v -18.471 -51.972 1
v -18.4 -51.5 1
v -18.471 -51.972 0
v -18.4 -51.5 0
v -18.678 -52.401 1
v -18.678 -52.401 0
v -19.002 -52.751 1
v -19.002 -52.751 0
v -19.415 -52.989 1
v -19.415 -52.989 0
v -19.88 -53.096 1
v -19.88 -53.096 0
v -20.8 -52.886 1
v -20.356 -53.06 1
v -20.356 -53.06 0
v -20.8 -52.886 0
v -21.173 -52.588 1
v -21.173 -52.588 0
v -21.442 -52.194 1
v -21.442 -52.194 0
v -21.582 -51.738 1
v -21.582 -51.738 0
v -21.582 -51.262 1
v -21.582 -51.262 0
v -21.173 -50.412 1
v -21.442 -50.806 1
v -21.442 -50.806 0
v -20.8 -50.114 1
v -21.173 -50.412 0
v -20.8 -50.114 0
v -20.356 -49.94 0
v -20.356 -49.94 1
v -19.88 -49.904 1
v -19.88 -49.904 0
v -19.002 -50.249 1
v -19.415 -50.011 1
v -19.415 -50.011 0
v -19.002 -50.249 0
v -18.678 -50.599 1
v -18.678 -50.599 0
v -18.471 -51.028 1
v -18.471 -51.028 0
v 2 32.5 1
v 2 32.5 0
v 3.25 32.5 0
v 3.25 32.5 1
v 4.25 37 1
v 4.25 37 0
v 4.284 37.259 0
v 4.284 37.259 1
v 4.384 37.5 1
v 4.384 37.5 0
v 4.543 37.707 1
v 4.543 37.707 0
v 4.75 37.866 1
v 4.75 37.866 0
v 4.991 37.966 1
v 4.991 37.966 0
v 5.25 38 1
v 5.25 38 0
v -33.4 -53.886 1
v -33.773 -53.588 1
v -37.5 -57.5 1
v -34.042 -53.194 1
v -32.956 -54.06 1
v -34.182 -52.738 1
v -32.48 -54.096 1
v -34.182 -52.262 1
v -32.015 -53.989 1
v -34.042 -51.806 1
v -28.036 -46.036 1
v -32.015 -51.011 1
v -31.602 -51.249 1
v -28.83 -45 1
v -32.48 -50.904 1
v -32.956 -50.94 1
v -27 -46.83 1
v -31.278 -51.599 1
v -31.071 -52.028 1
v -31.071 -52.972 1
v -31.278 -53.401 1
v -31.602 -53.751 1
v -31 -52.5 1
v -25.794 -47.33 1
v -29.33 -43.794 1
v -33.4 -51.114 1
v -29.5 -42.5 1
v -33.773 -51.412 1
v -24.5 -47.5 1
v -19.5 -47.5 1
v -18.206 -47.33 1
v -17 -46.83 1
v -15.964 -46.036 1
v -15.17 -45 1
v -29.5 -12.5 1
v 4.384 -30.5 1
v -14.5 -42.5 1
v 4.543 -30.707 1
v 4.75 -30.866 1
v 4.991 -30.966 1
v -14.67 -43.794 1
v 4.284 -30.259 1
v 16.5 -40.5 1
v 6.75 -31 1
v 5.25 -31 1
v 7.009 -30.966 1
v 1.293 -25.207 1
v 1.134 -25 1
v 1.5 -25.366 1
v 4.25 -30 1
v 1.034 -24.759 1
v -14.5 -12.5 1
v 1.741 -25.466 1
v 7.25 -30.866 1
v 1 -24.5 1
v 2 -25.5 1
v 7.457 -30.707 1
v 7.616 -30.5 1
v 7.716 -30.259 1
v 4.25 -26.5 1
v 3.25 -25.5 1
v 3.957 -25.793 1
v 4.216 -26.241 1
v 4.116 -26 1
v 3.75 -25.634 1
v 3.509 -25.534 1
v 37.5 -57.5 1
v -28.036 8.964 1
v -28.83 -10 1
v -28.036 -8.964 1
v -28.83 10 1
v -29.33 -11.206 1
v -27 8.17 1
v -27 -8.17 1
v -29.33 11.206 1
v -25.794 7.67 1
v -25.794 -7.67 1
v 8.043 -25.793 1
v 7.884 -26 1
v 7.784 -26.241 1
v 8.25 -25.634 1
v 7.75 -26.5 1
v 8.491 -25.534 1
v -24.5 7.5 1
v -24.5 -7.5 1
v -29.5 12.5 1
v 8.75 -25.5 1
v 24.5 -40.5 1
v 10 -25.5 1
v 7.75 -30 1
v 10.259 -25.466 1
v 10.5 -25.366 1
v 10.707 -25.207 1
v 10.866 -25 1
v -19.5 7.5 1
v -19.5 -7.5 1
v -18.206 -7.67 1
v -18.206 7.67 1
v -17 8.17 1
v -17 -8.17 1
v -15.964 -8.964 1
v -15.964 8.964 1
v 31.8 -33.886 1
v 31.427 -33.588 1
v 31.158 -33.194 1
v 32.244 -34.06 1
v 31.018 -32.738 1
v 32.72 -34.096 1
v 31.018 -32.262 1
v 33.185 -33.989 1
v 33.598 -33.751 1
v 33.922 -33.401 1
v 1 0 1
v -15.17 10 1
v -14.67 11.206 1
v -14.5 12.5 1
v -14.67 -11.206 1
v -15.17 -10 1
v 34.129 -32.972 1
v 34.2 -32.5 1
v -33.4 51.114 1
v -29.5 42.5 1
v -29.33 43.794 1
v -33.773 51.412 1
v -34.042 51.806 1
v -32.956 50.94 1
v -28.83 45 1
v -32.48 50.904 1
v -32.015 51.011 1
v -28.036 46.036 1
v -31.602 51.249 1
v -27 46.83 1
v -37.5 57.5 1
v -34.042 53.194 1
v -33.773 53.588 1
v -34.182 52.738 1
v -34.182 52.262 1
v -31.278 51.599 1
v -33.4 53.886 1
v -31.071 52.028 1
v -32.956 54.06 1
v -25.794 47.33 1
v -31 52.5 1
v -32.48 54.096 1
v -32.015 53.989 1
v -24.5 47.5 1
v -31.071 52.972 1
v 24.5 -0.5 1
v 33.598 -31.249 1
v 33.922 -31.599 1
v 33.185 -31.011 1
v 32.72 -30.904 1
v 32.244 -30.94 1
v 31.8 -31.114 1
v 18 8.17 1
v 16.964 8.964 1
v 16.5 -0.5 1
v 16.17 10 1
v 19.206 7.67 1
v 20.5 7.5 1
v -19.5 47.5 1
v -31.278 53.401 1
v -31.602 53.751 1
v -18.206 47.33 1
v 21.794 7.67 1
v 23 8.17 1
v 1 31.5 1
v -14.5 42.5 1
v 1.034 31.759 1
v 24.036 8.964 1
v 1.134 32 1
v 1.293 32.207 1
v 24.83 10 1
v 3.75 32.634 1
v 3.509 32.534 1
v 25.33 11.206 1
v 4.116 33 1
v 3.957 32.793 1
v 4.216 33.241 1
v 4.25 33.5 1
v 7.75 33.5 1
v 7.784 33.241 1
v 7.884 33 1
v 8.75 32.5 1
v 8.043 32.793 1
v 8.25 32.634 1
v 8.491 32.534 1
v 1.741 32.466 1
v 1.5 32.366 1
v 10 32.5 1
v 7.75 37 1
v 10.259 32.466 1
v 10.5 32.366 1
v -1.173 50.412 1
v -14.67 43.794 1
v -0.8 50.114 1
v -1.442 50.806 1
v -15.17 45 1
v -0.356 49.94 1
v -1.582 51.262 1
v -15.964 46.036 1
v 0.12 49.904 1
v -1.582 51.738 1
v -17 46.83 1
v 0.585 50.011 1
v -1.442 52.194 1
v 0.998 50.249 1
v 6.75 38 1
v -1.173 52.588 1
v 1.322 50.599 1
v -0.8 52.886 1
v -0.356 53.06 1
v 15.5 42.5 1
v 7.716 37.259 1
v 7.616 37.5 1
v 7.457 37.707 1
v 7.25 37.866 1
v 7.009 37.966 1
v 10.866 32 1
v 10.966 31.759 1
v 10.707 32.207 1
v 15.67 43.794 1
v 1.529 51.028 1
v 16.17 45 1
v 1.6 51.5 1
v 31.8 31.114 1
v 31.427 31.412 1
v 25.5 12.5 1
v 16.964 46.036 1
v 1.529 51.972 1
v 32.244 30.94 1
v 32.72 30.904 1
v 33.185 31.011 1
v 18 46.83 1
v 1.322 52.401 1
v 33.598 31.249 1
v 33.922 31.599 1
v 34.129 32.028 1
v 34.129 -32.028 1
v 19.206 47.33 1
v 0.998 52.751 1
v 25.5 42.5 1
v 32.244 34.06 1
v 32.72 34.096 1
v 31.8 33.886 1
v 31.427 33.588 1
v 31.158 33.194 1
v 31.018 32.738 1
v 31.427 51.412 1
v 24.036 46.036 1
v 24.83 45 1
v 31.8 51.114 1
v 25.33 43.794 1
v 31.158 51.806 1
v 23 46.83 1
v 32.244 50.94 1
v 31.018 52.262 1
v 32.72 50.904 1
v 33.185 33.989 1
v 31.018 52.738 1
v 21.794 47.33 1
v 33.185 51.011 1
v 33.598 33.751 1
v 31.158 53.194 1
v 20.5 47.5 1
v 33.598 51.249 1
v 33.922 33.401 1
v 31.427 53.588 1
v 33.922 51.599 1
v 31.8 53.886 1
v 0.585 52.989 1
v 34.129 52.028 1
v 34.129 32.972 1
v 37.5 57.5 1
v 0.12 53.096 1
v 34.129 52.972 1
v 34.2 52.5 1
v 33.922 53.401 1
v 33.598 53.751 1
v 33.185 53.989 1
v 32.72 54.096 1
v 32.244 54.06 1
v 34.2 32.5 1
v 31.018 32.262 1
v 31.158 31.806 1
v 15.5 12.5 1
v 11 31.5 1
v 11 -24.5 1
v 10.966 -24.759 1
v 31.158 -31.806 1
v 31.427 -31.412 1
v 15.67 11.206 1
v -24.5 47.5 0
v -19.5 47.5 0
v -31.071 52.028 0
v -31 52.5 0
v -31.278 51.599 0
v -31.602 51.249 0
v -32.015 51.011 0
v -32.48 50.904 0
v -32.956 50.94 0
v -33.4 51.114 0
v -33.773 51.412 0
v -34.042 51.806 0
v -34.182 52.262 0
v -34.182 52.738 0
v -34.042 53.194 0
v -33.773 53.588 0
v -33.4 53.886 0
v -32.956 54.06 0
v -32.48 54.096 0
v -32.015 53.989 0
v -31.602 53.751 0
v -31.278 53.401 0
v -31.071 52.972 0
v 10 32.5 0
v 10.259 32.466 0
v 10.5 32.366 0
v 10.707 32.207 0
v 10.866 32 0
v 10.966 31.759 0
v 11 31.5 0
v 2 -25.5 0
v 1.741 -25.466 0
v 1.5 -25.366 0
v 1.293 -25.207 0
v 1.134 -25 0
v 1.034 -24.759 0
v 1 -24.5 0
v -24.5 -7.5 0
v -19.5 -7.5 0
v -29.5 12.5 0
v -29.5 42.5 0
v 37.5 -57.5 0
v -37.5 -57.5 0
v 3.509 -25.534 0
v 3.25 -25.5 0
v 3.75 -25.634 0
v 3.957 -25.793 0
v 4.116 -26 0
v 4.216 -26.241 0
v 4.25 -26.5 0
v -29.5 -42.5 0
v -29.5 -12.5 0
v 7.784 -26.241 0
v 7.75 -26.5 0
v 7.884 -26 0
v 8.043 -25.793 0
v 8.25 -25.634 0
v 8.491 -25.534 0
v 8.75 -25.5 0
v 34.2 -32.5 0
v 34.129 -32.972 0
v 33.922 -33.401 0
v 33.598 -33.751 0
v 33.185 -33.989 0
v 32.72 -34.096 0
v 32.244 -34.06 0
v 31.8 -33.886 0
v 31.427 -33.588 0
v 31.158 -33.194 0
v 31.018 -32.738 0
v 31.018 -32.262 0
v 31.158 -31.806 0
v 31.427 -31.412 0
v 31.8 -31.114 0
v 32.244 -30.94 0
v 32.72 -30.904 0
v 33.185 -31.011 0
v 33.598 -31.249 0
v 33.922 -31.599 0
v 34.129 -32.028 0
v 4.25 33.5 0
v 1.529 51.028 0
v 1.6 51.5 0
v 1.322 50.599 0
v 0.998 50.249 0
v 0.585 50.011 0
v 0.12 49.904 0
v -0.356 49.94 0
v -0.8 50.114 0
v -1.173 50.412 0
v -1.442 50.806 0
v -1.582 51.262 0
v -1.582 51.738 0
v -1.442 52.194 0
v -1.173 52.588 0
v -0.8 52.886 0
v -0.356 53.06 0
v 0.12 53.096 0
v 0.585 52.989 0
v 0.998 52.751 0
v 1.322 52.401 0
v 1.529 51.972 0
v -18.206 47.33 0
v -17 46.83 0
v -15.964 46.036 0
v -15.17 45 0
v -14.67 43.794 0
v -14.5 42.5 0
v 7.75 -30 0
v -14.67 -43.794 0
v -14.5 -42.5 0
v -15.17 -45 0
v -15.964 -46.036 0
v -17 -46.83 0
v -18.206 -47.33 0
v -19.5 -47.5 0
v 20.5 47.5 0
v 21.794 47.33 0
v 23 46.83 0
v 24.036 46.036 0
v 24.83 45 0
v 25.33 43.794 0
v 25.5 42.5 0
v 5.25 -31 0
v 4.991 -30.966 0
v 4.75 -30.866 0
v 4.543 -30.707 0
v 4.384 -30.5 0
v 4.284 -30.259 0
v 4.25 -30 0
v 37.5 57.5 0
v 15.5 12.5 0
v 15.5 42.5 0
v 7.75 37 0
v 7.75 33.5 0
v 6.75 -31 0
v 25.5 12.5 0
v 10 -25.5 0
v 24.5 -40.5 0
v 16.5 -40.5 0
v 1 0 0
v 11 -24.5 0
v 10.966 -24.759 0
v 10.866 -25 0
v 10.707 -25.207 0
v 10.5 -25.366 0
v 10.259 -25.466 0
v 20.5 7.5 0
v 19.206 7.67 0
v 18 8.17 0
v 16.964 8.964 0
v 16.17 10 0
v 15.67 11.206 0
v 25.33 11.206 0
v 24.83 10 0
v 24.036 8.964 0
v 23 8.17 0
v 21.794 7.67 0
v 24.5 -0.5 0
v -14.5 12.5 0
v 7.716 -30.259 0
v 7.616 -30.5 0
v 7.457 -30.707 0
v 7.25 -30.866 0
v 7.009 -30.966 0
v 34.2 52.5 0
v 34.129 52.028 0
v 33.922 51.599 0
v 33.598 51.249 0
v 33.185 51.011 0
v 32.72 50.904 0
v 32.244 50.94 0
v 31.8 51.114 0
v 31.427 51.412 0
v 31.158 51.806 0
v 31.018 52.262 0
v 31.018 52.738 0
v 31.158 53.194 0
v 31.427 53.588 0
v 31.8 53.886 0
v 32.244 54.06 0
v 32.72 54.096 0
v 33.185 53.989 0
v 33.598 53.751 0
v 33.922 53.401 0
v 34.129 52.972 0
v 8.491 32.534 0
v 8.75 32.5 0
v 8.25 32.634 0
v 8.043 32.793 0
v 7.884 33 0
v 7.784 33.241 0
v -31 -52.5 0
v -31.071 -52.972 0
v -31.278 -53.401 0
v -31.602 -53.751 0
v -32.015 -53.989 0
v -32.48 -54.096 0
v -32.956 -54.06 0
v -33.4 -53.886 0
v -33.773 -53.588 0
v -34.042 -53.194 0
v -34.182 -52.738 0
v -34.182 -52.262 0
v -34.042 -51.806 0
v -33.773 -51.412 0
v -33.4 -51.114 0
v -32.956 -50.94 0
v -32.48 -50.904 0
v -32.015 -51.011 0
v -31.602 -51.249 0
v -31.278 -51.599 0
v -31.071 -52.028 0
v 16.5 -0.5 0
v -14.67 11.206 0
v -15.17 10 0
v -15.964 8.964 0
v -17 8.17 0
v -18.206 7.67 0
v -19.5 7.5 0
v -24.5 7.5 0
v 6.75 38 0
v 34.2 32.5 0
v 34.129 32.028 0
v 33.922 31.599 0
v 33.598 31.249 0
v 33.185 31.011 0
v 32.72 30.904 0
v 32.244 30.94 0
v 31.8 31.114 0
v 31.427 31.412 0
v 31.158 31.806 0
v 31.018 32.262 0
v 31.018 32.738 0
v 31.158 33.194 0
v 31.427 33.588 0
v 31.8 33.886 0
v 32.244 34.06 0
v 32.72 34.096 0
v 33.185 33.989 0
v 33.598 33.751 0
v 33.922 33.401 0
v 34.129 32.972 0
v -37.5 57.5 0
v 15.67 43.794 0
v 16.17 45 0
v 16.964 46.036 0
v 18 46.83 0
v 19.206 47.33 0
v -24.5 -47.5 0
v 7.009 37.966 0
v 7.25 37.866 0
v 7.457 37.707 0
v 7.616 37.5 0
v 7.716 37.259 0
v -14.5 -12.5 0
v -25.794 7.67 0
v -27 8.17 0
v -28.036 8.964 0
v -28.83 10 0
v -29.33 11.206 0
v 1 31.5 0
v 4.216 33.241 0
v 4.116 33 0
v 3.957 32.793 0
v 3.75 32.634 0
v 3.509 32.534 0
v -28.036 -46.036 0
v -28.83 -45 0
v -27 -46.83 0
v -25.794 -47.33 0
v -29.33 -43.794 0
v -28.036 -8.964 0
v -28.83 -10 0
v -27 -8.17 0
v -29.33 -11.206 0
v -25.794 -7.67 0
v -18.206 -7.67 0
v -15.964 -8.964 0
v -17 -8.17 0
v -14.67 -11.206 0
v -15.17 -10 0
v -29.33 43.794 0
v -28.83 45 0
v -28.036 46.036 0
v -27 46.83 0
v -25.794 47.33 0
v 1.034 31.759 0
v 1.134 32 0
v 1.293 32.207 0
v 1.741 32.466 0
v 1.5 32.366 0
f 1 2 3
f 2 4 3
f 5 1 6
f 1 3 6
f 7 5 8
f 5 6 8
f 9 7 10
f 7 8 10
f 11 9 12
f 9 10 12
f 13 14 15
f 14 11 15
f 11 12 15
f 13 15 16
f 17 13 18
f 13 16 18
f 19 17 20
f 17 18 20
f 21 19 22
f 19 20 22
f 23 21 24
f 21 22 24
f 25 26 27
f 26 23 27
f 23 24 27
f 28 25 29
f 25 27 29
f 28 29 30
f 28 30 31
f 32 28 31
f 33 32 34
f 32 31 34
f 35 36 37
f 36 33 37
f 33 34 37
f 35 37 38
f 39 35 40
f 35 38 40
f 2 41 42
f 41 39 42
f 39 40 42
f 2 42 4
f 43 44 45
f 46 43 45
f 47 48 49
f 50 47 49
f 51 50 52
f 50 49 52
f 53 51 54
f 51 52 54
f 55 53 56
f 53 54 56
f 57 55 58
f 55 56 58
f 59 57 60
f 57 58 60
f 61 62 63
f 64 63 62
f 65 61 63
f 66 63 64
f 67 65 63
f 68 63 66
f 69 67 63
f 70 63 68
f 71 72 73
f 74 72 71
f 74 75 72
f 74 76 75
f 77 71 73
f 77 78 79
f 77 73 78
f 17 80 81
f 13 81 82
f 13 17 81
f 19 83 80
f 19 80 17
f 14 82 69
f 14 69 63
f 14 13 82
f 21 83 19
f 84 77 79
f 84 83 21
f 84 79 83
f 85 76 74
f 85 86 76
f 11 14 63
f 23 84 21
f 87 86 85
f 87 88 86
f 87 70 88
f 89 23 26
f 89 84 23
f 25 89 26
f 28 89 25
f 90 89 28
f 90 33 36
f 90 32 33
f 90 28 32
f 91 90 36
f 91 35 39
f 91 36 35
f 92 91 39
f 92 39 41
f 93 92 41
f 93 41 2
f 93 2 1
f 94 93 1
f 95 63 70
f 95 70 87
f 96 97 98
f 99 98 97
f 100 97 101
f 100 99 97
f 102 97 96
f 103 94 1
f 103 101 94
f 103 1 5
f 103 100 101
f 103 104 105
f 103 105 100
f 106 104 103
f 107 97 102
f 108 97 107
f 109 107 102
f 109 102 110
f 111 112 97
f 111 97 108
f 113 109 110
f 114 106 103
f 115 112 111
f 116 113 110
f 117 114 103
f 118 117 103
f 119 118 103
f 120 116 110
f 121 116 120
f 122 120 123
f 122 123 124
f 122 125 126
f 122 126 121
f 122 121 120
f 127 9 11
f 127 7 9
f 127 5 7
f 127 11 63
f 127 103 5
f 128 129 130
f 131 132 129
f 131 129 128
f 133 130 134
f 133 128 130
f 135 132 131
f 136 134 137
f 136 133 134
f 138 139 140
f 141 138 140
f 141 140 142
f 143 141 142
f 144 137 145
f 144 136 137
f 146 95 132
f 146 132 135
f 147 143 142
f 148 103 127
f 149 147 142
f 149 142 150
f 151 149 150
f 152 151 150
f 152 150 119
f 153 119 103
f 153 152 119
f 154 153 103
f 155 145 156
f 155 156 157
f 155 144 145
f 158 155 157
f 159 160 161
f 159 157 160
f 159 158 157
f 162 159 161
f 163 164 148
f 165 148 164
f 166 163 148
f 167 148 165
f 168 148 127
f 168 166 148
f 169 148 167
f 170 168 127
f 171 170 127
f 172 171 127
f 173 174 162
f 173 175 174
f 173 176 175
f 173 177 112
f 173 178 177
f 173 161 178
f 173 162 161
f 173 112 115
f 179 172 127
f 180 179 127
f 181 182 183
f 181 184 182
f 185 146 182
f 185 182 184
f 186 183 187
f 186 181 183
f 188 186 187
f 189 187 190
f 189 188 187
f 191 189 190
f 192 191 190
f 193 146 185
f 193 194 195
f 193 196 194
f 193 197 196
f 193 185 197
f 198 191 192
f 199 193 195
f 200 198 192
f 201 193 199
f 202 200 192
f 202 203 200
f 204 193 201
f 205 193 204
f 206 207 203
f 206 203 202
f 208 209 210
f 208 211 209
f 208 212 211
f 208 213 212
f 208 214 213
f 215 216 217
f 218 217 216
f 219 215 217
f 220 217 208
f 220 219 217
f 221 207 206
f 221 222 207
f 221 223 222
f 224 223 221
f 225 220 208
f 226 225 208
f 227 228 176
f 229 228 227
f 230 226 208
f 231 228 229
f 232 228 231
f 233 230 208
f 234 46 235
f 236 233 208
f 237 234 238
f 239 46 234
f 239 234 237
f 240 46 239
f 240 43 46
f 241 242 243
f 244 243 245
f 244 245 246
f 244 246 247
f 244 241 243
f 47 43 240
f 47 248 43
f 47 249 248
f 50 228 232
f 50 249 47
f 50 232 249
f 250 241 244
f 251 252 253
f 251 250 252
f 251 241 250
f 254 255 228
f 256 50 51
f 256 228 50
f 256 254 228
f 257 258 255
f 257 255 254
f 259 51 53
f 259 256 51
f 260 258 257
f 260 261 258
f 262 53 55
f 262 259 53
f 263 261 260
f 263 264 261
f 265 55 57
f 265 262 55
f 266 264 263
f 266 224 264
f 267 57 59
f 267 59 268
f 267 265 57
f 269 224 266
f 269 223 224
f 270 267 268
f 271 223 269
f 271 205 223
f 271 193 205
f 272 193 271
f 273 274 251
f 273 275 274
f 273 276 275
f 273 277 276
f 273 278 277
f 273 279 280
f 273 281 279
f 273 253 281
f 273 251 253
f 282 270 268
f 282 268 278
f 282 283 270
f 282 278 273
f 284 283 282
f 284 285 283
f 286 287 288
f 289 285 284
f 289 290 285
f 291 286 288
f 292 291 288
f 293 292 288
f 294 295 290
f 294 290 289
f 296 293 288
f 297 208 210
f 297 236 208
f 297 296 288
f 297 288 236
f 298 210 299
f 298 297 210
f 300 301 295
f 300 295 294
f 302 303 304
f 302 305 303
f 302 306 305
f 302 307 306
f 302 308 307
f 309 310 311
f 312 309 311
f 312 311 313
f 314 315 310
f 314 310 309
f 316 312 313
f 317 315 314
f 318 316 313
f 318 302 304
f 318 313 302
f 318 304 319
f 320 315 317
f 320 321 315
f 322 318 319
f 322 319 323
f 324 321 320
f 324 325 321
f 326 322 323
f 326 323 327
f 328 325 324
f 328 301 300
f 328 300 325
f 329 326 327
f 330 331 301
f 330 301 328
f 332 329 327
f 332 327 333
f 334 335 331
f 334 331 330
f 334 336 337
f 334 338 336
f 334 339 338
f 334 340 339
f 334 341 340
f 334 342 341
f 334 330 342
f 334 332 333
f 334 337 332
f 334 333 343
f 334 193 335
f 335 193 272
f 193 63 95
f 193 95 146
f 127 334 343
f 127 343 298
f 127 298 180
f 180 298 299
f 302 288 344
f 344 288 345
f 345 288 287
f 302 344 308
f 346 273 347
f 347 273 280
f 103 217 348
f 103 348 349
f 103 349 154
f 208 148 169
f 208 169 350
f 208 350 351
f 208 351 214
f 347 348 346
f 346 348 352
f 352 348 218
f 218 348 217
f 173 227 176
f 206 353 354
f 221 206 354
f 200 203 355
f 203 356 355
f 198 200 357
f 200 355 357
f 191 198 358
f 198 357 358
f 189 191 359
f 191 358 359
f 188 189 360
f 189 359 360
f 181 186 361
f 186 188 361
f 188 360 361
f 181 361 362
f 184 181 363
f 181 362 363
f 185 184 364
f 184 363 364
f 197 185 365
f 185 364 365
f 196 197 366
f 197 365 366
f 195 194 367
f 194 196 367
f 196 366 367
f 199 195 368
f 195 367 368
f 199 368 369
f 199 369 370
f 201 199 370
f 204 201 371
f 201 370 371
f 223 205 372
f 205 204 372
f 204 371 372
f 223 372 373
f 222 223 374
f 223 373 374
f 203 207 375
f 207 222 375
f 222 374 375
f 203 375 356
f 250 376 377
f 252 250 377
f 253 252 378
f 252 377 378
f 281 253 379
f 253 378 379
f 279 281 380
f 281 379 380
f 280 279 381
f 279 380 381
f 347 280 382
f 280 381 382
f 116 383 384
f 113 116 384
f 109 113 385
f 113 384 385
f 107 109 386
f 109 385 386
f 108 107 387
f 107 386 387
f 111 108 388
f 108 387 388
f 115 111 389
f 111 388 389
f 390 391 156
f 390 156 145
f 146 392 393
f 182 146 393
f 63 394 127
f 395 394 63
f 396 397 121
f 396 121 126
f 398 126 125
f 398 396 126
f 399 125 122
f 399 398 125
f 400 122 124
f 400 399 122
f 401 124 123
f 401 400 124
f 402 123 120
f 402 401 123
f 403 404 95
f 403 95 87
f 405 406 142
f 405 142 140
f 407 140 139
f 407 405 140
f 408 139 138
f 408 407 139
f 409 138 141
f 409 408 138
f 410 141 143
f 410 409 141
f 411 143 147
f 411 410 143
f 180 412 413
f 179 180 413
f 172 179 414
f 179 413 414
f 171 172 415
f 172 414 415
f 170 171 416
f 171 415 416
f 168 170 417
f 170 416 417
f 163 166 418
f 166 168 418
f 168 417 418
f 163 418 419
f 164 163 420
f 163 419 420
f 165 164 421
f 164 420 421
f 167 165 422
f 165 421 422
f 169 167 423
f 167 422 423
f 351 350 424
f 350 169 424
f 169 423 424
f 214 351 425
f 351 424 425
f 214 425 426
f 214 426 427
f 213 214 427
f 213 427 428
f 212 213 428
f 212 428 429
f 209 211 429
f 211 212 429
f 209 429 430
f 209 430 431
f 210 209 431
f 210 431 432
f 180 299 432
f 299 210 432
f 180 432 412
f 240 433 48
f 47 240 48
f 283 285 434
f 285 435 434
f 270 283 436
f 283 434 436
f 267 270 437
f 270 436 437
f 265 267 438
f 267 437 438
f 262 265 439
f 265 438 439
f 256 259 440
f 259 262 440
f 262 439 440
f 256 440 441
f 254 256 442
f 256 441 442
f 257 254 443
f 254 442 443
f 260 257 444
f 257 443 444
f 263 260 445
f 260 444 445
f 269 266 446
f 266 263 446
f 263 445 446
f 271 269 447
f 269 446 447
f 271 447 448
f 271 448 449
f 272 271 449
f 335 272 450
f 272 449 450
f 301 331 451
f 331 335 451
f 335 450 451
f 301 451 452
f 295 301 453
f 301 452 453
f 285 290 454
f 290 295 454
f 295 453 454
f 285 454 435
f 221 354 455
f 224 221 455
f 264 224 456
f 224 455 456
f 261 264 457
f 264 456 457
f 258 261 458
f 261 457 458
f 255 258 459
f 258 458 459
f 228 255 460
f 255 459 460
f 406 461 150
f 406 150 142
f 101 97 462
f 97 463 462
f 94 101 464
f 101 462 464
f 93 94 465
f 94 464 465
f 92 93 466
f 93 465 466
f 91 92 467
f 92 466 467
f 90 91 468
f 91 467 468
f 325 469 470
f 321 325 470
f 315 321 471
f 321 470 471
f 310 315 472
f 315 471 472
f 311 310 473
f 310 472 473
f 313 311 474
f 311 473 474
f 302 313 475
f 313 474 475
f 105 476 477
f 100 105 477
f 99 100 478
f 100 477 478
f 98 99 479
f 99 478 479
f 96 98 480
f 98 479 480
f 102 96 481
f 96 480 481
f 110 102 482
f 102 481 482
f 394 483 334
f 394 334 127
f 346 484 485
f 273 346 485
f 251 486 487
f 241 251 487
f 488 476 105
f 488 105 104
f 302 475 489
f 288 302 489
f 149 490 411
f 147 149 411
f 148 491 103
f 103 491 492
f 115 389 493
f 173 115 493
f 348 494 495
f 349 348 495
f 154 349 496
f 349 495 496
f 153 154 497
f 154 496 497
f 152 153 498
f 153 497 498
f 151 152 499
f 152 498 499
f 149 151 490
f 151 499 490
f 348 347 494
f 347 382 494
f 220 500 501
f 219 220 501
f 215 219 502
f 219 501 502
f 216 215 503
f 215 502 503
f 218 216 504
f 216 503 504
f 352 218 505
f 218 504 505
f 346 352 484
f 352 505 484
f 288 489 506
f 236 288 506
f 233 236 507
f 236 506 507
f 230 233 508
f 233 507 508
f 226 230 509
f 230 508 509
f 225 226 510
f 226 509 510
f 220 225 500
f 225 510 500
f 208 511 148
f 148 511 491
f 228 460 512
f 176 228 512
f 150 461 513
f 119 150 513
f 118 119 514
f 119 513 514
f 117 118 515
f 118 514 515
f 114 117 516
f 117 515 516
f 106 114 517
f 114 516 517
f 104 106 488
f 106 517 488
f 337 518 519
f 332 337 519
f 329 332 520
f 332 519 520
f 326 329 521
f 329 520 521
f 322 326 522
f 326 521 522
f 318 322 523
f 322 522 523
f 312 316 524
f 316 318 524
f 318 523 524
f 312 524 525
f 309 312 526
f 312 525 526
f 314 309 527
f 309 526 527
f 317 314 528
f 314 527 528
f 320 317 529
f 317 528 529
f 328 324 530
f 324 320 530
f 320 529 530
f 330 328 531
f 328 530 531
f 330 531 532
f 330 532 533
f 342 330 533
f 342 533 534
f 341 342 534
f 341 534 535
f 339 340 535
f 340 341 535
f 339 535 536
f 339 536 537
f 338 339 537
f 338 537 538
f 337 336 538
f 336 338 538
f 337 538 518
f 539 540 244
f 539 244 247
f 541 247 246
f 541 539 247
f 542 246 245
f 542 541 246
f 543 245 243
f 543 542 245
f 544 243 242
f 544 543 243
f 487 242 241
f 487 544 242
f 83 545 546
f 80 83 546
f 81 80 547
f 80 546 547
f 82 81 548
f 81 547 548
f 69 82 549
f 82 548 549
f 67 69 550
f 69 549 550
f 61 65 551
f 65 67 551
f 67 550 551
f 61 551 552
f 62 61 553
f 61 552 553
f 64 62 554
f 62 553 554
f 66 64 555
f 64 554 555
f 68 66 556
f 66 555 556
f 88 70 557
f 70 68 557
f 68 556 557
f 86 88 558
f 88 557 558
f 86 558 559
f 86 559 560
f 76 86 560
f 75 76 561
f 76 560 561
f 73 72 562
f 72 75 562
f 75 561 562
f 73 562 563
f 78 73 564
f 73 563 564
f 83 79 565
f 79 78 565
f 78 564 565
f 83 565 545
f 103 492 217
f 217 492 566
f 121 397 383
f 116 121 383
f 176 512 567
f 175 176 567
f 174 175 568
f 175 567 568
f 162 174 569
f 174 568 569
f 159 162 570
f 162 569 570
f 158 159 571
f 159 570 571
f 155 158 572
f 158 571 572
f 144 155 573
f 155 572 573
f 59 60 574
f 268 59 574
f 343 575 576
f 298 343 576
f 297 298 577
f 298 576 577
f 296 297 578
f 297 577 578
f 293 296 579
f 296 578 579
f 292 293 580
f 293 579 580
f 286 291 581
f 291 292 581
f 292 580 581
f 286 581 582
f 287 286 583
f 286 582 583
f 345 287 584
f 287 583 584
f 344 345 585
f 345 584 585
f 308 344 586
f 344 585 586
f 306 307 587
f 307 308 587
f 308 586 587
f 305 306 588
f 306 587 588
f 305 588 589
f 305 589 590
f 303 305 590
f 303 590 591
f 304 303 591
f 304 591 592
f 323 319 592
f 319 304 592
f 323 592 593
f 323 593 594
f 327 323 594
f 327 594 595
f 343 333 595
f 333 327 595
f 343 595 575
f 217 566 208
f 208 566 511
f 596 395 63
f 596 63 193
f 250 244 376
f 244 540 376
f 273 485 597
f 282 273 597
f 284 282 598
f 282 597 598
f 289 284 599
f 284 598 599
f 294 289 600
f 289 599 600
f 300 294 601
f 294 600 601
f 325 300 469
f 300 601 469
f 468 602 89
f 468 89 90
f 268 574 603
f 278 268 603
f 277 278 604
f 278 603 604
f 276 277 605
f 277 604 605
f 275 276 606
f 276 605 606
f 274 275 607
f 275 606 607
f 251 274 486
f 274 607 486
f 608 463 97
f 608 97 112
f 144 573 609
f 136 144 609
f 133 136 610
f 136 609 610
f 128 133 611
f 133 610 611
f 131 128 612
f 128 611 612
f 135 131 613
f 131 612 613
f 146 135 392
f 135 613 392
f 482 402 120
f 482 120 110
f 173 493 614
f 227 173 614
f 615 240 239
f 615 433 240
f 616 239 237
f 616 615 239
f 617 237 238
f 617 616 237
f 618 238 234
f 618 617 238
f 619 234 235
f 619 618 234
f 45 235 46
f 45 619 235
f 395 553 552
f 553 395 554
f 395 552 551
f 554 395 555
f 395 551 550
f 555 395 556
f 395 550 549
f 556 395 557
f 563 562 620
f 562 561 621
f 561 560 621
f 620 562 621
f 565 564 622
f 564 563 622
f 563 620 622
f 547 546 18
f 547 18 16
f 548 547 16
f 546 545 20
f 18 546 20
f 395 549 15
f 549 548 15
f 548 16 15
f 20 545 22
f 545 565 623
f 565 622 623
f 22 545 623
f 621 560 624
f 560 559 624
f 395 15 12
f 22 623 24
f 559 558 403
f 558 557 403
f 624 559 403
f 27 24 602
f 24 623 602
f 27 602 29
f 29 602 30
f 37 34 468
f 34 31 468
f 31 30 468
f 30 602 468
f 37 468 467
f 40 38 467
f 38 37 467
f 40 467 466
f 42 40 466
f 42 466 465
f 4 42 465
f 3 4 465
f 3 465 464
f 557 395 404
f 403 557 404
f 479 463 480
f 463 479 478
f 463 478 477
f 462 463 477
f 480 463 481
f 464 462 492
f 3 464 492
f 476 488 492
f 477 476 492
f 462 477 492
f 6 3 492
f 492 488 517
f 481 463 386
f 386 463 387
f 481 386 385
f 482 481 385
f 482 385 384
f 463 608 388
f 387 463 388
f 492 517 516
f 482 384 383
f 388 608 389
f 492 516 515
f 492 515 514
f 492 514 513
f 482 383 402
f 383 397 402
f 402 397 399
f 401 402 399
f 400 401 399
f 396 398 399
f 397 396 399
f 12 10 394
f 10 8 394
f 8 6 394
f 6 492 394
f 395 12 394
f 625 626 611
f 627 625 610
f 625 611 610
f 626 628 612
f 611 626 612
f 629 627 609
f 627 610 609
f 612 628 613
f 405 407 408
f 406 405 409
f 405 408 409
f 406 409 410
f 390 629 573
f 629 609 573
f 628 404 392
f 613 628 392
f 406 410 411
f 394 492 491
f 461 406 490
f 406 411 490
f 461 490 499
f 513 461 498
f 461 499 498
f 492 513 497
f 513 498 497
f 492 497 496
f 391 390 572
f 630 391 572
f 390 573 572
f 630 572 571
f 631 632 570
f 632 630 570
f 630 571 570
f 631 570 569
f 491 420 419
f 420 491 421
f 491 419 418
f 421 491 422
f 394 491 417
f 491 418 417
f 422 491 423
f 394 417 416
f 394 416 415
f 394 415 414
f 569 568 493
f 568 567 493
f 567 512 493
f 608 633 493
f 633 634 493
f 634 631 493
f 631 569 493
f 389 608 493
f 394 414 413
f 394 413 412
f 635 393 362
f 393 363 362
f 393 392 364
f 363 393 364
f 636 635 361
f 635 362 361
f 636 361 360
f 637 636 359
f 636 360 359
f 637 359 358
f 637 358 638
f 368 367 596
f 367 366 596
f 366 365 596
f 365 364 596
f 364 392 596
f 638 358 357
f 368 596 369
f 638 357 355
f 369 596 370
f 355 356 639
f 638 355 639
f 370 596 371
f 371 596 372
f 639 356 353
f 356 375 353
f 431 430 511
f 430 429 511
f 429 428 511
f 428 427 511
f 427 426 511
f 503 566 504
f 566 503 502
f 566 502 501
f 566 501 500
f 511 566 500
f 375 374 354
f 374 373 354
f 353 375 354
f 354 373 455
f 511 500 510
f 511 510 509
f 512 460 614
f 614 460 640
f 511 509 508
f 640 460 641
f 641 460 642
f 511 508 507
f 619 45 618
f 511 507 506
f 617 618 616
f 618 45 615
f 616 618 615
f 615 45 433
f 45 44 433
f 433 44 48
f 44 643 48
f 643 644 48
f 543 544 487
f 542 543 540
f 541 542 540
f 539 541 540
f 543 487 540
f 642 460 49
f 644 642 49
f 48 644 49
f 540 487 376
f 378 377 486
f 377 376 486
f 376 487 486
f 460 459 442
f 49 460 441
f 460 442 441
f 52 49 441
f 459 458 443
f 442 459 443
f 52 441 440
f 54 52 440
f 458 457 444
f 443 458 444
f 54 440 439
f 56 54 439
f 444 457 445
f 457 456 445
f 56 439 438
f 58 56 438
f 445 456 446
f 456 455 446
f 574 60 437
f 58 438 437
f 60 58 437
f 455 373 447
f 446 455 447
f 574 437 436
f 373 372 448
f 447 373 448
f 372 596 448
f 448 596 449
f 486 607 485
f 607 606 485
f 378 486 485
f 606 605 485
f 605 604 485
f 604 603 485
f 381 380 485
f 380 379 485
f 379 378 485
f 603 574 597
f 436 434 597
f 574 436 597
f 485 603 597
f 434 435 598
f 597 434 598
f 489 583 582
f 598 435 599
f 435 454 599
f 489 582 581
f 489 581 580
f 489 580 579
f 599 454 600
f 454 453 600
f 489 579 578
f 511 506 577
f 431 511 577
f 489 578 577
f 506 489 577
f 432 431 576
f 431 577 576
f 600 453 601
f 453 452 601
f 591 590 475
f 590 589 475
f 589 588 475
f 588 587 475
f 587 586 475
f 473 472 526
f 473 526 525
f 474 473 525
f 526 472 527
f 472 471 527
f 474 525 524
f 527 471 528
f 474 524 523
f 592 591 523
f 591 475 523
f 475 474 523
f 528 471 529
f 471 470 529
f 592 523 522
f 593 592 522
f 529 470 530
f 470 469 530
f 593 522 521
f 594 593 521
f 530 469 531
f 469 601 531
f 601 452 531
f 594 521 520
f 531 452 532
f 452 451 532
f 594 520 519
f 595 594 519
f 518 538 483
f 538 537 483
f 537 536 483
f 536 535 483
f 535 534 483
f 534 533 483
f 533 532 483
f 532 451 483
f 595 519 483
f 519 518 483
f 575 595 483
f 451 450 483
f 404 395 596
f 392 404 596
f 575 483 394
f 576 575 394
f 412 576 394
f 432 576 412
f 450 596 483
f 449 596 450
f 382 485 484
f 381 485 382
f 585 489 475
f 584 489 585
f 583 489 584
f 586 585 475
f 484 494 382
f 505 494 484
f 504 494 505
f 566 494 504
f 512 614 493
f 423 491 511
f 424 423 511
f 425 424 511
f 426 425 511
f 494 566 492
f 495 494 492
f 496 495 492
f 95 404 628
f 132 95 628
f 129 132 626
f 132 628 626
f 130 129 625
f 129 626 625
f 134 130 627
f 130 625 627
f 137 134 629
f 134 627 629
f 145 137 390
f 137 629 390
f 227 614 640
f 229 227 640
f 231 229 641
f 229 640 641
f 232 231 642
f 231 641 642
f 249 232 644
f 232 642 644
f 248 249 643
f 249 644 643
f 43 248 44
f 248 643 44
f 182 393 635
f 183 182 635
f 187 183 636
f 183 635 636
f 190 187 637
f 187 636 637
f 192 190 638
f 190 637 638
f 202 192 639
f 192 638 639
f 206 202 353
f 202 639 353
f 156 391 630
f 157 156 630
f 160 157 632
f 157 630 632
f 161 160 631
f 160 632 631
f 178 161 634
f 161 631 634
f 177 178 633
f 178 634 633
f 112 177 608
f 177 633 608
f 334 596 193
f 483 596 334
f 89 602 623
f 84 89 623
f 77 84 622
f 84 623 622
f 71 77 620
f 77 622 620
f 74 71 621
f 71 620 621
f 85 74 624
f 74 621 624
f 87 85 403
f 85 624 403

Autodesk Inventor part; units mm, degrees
ref_plane "YZ Plane" through (0, 0, 0) normal (1, 0, 0) x (0, 1, 0)
ref_plane "XZ Plane" through (0, 0, 0) normal (0, 1, 0) x (-1, 0, 0)
ref_plane "XY Plane" through (0, 0, 0) normal (0, 0, 1) x (1, 0, 0)
sketch "Sketch1" plane through (0, 0, 0) normal (0, 0, 1) x (1, 0, 0)
  line L0 (-37.5, 57.5) -> (37.5, 57.5)
  line L1 (37.5, 57.5) -> (37.5, -57.5)
  line L2 (37.5, -57.5) -> (-37.5, -57.5)
  line L3 (-37.5, -57.5) -> (-37.5, 57.5)
  line L4 (-37.5, 57.5) -> (37.5, -57.5) construction
  line L5 (37.5, 57.5) -> (-37.5, -57.5) construction
  line L6 (11, 31.5) -> (11, -24.5)
  line L7 (1, -24.5) -> (1, 31.5)
  line L8 (1, 32.5) -> (11, -25.5) construction
  line L9 (11, 32.5) -> (1, -25.5) construction
  line L10 (5.25, 38) -> (6.75, 38)
  line L11 (7.75, 37) -> (7.75, 33.5)
  line L12 (4.25, 33.5) -> (4.25, 37)
  line L13 (4.25, 38) -> (7.75, 32.5) construction
  line L14 (7.75, 38) -> (4.25, 32.5) construction
  line L15 (5.25, -31) -> (6.75, -31)
  line L16 (7.75, -30) -> (7.75, -26.5)
  line L17 (4.25, -26.5) -> (4.25, -30)
  line L18 (4.25, -31) -> (7.75, -25.5) construction
  line L19 (7.75, -31) -> (4.25, -25.5) construction
  circle A0 centre (-32.6, 52.5) radius 1.6
  line L20 (0, 0) -> (0, 3.4669)
  line L21 (0, 0) -> (3.1568, 0)
  circle A1 centre (32.6, 52.5) radius 1.6
  circle A2 centre (-32.6, -52.5) radius 1.6
  circle A3 centre (-20, -51.5) radius 1.6
  circle A4 centre (32.6, -32.5) radius 1.6
  circle A5 centre (32.6, 32.5) radius 1.6
  circle A6 centre (0, 51.5) radius 1.6
  line L22 (16.5, -0.5) -> (24.5, -0.5)
  line L23 (24.5, -0.5) -> (24.5, -40.5)
  line L24 (24.5, -40.5) -> (16.5, -40.5)
  line L25 (16.5, -40.5) -> (16.5, -0.5)
  line L26 (16.5, -0.5) -> (24.5, -40.5) construction
  line L27 (24.5, -0.5) -> (16.5, -40.5) construction
  line L28 (-24.5, 47.5) -> (-19.5, 47.5)
  line L29 (-14.5, 42.5) -> (-14.5, 12.5)
  line L30 (-19.5, 7.5) -> (-24.5, 7.5)
  line L31 (-29.5, 12.5) -> (-29.5, 42.5)
  line L32 (-29.5, 47.5) -> (-14.5, 7.5) construction
  line L33 (-14.5, 47.5) -> (-29.5, 7.5) construction
  arc A7 (-24.5, 47.5) -> (-29.5, 42.5) centre (-24.5, 42.5) ccw
  arc A8 (-14.5, 42.5) -> (-19.5, 47.5) centre (-19.5, 42.5) ccw
  arc A9 (-19.5, 7.5) -> (-14.5, 12.5) centre (-19.5, 12.5) ccw
  arc A10 (-29.5, 12.5) -> (-24.5, 7.5) centre (-24.5, 12.5) ccw
  line L34 (-24.5, -47.5) -> (-19.5, -47.5)
  line L35 (-14.5, -42.5) -> (-14.5, -12.5)
  line L36 (-19.5, -7.5) -> (-24.5, -7.5)
  line L37 (-29.5, -12.5) -> (-29.5, -42.5)
  line L38 (-29.5, -47.5) -> (-14.5, -7.5) construction
  line L39 (-14.5, -47.5) -> (-29.5, -7.5) construction
  arc A11 (-29.5, -42.5) -> (-24.5, -47.5) centre (-24.5, -42.5) ccw
  arc A12 (-19.5, -47.5) -> (-14.5, -42.5) centre (-19.5, -42.5) ccw
  arc A13 (-14.5, -12.5) -> (-19.5, -7.5) centre (-19.5, -12.5) ccw
  arc A14 (-24.5, -7.5) -> (-29.5, -12.5) centre (-24.5, -12.5) ccw
  line L40 (20.5, 47.5) -> (20.5, 47.5)
  line L41 (25.5, 42.5) -> (25.5, 12.5)
  line L42 (20.5, 7.5) -> (20.5, 7.5)
  line L43 (15.5, 12.5) -> (15.5, 42.5)
  line L44 (15.5, 47.5) -> (25.5, 7.5) construction
  line L45 (25.5, 47.5) -> (15.5, 7.5) construction
  arc A15 (20.5, 47.5) -> (15.5, 42.5) centre (20.5, 42.5) ccw
  arc A16 (25.5, 42.5) -> (20.5, 47.5) centre (20.5, 42.5) ccw
  arc A17 (20.5, 7.5) -> (25.5, 12.5) centre (20.5, 12.5) ccw
  arc A18 (15.5, 12.5) -> (20.5, 7.5) centre (20.5, 12.5) ccw
  arc A19 (5.25, 38) -> (4.25, 37) centre (5.25, 37) ccw
  arc A20 (7.75, 37) -> (6.75, 38) centre (6.75, 37) ccw
  arc A21 (4.25, -30) -> (5.25, -31) centre (5.25, -30) ccw
  arc A22 (6.75, -31) -> (7.75, -30) centre (6.75, -30) ccw
  line L46 (10, -25.5) -> (8.75, -25.5)
  line L47 (3.25, -25.5) -> (2, -25.5)
  line L48 (2, 32.5) -> (3.25, 32.5)
  line L49 (8.75, 32.5) -> (10, 32.5)
  arc A23 (2, 32.5) -> (1, 31.5) centre (2, 31.5) ccw
  arc A24 (3.25, 32.5) -> (4.25, 33.5) centre (3.25, 33.5) ccw
  arc A25 (7.75, 33.5) -> (8.75, 32.5) centre (8.75, 33.5) ccw
  arc A26 (11, 31.5) -> (10, 32.5) centre (10, 31.5) ccw
  arc A27 (10, -25.5) -> (11, -24.5) centre (10, -24.5) ccw
  arc A28 (8.75, -25.5) -> (7.75, -26.5) centre (8.75, -26.5) ccw
  arc A29 (4.25, -26.5) -> (3.25, -25.5) centre (3.25, -26.5) ccw
  arc A30 (1, -24.5) -> (2, -25.5) centre (2, -24.5) ccw
  point P0 (6, 3.5)
  point P1 (6, 35.25)
  point P2 (6, -28.25)
  point P3 (20.5, -20.5)
  point P4 (-22, 27.5)
  point P5 (-22, -27.5)
  point P6 (20.5, 27.5)
  point P7 (0, -57.5)
  point P8 (0, 57.5)
  dimension "d0" = 75
  dimension "d1" = 115
  dimension "d2" = 3.5
  dimension "d3" = 5.5
  dimension "d4" = 10
  dimension "d5" = 58
  dimension "d6" = 26.5
  dimension "d9" = 3.2
  dimension "d10" = 5
  dimension "d11" = 4.9
  dimension "d14" = 3.2
  dimension "d15" = 6
  dimension "d16" = 3.2
  dimension "d18" = 4.9
  dimension "d19" = 25
  dimension "d20" = 8
  dimension "d21" = 40
  dimension "d23" = 13
  dimension "d24" = 17
  dimension "d25" = 15
  dimension "d26" = 40
  dimension "d27" = 5
  dimension "d28" = 10
  dimension "d29" = 8
  dimension "d30" = 40
  dimension "d31" = 10
  dimension "d32" = 12
  dimension "d33" = 10
  dimension "d34" = 5
  dimension "d36" = 20
  dimension "d37" = 6
  dimension "d38" = 0
  dimension "d39" = 3.2
  dimension "d40" = 1
  dimension "d41" = 25
  dimension "d42" = 1
extrude "Plate1" add sketch "Sketch1" along normal blind 1
equation "\"d8\" = 厚度"
equation "\"折彎半徑\" = 厚度"
equation "\"折彎離隙寬度\" = 厚度"
equation "\"折彎離隙深度\" = 0.5 * 厚度"
equation "\"轉角離隙大小\" = 4 * 厚度"
equation "\"最小剩餘\" = 2 * 厚度"
equation "\"轉移半徑\" = 折彎半徑"
equation "\"Jacobi半徑大小\" = 折彎半徑"
equation "\"間隙大小\" = 厚度"
equation "\"厚度\" = 1"
properties part number "PCB_board_box_back" material "Aluminum"
